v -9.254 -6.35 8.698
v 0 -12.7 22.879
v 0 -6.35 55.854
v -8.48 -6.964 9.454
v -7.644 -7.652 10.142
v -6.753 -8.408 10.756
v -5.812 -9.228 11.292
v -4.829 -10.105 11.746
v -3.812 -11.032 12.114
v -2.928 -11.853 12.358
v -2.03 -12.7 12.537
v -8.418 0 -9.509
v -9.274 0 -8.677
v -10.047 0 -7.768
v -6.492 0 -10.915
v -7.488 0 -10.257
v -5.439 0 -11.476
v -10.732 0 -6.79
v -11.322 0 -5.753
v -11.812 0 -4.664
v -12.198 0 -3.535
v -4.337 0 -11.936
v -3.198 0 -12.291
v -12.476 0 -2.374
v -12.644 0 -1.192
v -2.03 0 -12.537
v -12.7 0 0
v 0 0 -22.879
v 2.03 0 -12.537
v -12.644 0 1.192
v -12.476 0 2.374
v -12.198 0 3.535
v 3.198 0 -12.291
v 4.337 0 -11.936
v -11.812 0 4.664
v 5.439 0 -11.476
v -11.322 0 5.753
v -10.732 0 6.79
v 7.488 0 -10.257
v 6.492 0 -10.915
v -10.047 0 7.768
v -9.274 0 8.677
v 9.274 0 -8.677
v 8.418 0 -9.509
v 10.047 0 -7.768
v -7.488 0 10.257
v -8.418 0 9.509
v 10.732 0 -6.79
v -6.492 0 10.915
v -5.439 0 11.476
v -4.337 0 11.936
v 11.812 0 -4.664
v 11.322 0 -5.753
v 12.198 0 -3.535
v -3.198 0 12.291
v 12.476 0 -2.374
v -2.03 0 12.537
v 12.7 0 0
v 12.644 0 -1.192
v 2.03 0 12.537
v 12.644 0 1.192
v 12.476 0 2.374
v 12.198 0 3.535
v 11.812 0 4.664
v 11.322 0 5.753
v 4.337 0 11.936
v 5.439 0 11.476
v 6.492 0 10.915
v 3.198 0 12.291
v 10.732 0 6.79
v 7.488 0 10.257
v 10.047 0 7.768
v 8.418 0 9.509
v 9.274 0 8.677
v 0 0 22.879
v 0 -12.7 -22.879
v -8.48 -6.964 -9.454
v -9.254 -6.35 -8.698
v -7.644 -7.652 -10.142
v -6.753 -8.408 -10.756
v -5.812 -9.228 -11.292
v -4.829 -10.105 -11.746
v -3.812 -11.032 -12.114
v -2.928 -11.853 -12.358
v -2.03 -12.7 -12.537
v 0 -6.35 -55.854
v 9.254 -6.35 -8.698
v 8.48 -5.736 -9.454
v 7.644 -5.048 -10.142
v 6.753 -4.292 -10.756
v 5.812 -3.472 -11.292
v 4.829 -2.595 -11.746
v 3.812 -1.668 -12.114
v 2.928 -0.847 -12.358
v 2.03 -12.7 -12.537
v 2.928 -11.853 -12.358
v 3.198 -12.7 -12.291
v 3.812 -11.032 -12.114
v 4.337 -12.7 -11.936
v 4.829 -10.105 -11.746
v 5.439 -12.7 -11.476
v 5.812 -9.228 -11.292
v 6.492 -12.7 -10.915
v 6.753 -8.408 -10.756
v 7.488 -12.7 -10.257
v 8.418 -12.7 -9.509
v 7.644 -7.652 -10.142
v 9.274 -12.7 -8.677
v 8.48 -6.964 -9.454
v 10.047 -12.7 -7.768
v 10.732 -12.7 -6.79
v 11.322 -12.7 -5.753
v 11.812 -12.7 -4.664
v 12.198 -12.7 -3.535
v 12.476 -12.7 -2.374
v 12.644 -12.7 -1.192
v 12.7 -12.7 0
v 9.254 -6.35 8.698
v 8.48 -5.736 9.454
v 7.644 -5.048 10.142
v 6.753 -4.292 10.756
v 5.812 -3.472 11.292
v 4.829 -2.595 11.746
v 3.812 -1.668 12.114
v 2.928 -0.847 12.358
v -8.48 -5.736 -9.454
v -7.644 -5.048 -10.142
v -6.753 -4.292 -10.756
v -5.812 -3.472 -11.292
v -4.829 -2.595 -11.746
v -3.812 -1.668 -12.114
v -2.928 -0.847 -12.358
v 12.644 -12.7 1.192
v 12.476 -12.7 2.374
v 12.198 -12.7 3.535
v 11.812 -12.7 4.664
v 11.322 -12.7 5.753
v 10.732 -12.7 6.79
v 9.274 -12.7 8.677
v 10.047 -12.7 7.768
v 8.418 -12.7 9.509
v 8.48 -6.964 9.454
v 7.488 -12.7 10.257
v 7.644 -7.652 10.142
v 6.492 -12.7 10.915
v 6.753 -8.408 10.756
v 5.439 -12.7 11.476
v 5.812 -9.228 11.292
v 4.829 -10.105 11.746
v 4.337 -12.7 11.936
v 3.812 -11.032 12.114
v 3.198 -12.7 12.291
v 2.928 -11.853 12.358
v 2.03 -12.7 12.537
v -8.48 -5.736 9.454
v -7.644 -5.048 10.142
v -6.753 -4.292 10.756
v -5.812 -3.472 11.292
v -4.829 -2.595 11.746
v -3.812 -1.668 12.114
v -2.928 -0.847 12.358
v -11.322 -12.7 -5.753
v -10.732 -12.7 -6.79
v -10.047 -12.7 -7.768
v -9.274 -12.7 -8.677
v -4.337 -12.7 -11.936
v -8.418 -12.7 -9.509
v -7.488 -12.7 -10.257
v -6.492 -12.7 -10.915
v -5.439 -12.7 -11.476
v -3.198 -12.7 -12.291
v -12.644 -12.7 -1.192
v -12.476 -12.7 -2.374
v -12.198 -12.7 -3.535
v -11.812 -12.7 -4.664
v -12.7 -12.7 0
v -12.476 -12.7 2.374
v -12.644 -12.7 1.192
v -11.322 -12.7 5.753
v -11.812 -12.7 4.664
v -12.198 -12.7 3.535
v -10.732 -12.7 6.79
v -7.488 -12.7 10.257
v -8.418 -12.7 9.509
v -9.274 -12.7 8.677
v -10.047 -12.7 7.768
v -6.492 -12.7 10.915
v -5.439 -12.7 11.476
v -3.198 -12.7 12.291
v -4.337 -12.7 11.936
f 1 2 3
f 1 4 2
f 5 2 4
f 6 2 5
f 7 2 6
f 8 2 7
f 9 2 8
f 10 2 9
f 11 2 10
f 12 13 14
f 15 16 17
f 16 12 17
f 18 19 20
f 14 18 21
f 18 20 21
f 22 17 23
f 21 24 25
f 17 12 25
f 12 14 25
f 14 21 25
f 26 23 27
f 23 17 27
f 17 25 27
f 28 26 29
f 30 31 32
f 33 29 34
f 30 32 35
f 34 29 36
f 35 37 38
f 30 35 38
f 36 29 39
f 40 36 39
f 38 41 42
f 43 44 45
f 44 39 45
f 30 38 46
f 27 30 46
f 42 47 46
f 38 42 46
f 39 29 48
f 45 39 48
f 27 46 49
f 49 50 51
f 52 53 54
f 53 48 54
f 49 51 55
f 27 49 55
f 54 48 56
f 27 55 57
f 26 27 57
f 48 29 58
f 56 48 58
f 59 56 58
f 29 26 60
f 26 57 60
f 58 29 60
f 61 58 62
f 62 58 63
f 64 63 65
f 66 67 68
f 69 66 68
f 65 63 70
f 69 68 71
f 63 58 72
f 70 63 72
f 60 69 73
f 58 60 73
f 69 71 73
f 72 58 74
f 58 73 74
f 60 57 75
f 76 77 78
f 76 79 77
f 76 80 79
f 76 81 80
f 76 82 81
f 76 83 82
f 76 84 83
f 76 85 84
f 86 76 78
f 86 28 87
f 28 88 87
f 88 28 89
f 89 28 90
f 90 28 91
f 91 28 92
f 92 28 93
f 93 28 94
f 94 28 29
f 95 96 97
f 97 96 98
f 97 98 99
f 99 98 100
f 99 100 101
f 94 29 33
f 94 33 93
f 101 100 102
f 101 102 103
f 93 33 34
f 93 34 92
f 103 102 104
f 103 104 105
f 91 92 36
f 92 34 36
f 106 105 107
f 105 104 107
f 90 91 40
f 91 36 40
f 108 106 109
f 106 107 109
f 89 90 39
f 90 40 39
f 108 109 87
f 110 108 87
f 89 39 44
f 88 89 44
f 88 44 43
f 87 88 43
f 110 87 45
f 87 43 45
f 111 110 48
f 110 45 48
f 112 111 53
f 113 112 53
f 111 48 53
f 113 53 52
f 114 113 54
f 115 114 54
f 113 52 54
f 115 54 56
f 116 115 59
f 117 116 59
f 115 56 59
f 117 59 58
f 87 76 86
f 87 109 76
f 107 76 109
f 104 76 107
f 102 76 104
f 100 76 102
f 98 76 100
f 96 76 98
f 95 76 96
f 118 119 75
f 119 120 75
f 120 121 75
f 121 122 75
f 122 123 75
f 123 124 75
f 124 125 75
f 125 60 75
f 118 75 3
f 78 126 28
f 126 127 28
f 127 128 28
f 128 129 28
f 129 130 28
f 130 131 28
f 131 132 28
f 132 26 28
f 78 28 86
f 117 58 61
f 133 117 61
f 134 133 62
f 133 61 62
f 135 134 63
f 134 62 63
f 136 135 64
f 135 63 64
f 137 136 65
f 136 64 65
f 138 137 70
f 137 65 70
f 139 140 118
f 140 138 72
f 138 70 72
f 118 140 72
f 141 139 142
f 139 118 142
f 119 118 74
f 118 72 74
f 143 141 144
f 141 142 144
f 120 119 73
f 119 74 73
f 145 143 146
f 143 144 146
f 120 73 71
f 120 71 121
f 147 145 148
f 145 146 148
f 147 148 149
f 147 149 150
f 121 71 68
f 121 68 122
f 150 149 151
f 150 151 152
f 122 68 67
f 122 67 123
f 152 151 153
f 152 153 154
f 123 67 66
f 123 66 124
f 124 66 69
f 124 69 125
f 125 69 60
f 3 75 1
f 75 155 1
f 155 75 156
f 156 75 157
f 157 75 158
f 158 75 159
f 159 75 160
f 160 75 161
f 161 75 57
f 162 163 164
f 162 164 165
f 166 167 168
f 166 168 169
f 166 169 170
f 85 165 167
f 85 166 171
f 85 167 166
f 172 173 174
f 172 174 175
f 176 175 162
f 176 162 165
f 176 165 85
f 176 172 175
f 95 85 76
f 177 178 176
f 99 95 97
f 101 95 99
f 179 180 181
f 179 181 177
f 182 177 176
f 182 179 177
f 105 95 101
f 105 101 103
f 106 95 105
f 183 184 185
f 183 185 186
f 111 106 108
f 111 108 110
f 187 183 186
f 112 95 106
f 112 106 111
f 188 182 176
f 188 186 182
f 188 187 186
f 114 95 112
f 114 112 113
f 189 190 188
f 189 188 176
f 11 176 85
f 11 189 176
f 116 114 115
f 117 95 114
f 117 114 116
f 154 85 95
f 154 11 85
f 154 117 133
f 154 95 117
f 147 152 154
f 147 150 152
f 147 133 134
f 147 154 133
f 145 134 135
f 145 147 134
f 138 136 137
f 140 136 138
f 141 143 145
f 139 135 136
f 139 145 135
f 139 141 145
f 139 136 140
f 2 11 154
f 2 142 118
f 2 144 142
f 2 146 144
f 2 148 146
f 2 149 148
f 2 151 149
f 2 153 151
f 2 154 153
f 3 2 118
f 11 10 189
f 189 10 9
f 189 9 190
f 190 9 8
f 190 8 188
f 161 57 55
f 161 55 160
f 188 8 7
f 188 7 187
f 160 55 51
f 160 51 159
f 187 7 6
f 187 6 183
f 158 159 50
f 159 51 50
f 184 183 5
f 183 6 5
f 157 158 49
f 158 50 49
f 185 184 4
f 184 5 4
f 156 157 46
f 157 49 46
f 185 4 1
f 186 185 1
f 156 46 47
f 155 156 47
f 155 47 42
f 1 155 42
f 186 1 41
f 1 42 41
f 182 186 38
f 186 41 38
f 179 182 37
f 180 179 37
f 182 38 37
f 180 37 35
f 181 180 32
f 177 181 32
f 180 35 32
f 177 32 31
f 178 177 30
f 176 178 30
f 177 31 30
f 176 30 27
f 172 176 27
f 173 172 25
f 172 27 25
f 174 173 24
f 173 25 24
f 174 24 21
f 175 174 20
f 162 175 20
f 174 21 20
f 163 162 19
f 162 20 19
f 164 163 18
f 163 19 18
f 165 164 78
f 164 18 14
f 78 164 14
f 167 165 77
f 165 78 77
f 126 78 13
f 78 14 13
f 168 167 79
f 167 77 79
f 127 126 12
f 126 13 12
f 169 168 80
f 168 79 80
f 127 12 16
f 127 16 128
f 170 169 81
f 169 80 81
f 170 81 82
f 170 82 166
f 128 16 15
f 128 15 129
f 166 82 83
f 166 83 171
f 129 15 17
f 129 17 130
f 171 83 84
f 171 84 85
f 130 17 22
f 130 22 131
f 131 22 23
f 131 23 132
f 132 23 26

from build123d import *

# Parameters (mm, degrees)
F1_DEPTH = 12.7
F2_SIZE  = 6.34999


# Not quite as in the source:
# - a fillet or chamfer is up to 0.001 mm smaller than in the source, because OpenCascade refuses the exact size


with BuildPart() as f1:
    # F0 (on Front) → F1 (new body)
    with BuildSketch(Plane.XZ):
        with BuildLine():
            Line((0, 0), (12.7, 0))
            ThreePointArc((12.7, 0), (11.8071097568, 4.6778370206), (9.2539906785, 8.6979110436))
            ThreePointArc((9.2539906785, 8.6979110436), (5.0411570967, 11.6566176538), (0, 12.7))
            Line((0, 12.7), (0, 0))
        make_face()
        with BuildLine():
            ThreePointArc((9.2539906785, -8.6979110436), (11.8071097568, -4.6778370206), (12.7, 0))
            Line((12.7, 0), (0, 0))
            Line((0, 0), (0, -12.7))
            ThreePointArc((0, -12.7), (5.0411570967, -11.6566176538), (9.2539906785, -8.6979110436))
        make_face()
        with BuildLine():
            ThreePointArc((0, 12.7), (5.0411570967, 11.6566176538), (9.2539906785, 8.6979110436))
            Line((9.2539906785, 8.6979110436), (0, 55.8542348444))
            Line((0, 55.8542348444), (-9.2539906785, 8.6979110436))
            ThreePointArc((-9.2539906785, 8.6979110436), (-5.0411570967, 11.6566176538), (0, 12.7))
        make_face()
        with BuildLine():
            Line((0, -55.8542348444), (9.2539906785, -8.6979110436))
            ThreePointArc((9.2539906785, -8.6979110436), (5.0411570967, -11.6566176538), (0, -12.7))
            ThreePointArc((0, -12.7), (-5.0411570967, -11.6566176538), (-9.2539906785, -8.6979110436))
            Line((-9.2539906785, -8.6979110436), (0, -55.8542348444))
        make_face()
        with BuildLine():
            Line((-12.7, 0), (0, 0))
            Line((0, 0), (0, 12.7))
            ThreePointArc((0, 12.7), (-5.0411570967, 11.6566176538), (-9.2539906785, 8.6979110436))
            ThreePointArc((-9.2539906785, 8.6979110436), (-11.8071097568, 4.6778370206), (-12.7, 0))
        make_face()
        with BuildLine():
            Line((0, -12.7), (0, 0))
            Line((0, 0), (-12.7, 0))
            ThreePointArc((-12.7, 0), (-11.8071097568, -4.6778370206), (-9.2539906785, -8.6979110436))
            ThreePointArc((-9.2539906785, -8.6979110436), (-5.0411570967, -11.6566176538), (0, -12.7))
        make_face()
    extrude(amount=F1_DEPTH)

    # F2 (size 6.35 in the source; OpenCascade refuses exactly that, so slightly less here)
    f2_edges = [f1.edges().sort_by_distance(p)[0] for p in [
        (4.626995, -12.7, 32.276073),
        (4.626995, 0, 32.276073),
        (-4.626995, -12.7, 32.276073),
        (-4.626995, 0, 32.276073),
        (-4.626995, -12.7, -32.276073),
        (4.626995, -12.7, -32.276073),
        (-4.626995, 0, -32.276073),
        (4.626995, 0, -32.276073),
    ]]
    chamfer(f2_edges, length=F2_SIZE)


solid = f1.part
